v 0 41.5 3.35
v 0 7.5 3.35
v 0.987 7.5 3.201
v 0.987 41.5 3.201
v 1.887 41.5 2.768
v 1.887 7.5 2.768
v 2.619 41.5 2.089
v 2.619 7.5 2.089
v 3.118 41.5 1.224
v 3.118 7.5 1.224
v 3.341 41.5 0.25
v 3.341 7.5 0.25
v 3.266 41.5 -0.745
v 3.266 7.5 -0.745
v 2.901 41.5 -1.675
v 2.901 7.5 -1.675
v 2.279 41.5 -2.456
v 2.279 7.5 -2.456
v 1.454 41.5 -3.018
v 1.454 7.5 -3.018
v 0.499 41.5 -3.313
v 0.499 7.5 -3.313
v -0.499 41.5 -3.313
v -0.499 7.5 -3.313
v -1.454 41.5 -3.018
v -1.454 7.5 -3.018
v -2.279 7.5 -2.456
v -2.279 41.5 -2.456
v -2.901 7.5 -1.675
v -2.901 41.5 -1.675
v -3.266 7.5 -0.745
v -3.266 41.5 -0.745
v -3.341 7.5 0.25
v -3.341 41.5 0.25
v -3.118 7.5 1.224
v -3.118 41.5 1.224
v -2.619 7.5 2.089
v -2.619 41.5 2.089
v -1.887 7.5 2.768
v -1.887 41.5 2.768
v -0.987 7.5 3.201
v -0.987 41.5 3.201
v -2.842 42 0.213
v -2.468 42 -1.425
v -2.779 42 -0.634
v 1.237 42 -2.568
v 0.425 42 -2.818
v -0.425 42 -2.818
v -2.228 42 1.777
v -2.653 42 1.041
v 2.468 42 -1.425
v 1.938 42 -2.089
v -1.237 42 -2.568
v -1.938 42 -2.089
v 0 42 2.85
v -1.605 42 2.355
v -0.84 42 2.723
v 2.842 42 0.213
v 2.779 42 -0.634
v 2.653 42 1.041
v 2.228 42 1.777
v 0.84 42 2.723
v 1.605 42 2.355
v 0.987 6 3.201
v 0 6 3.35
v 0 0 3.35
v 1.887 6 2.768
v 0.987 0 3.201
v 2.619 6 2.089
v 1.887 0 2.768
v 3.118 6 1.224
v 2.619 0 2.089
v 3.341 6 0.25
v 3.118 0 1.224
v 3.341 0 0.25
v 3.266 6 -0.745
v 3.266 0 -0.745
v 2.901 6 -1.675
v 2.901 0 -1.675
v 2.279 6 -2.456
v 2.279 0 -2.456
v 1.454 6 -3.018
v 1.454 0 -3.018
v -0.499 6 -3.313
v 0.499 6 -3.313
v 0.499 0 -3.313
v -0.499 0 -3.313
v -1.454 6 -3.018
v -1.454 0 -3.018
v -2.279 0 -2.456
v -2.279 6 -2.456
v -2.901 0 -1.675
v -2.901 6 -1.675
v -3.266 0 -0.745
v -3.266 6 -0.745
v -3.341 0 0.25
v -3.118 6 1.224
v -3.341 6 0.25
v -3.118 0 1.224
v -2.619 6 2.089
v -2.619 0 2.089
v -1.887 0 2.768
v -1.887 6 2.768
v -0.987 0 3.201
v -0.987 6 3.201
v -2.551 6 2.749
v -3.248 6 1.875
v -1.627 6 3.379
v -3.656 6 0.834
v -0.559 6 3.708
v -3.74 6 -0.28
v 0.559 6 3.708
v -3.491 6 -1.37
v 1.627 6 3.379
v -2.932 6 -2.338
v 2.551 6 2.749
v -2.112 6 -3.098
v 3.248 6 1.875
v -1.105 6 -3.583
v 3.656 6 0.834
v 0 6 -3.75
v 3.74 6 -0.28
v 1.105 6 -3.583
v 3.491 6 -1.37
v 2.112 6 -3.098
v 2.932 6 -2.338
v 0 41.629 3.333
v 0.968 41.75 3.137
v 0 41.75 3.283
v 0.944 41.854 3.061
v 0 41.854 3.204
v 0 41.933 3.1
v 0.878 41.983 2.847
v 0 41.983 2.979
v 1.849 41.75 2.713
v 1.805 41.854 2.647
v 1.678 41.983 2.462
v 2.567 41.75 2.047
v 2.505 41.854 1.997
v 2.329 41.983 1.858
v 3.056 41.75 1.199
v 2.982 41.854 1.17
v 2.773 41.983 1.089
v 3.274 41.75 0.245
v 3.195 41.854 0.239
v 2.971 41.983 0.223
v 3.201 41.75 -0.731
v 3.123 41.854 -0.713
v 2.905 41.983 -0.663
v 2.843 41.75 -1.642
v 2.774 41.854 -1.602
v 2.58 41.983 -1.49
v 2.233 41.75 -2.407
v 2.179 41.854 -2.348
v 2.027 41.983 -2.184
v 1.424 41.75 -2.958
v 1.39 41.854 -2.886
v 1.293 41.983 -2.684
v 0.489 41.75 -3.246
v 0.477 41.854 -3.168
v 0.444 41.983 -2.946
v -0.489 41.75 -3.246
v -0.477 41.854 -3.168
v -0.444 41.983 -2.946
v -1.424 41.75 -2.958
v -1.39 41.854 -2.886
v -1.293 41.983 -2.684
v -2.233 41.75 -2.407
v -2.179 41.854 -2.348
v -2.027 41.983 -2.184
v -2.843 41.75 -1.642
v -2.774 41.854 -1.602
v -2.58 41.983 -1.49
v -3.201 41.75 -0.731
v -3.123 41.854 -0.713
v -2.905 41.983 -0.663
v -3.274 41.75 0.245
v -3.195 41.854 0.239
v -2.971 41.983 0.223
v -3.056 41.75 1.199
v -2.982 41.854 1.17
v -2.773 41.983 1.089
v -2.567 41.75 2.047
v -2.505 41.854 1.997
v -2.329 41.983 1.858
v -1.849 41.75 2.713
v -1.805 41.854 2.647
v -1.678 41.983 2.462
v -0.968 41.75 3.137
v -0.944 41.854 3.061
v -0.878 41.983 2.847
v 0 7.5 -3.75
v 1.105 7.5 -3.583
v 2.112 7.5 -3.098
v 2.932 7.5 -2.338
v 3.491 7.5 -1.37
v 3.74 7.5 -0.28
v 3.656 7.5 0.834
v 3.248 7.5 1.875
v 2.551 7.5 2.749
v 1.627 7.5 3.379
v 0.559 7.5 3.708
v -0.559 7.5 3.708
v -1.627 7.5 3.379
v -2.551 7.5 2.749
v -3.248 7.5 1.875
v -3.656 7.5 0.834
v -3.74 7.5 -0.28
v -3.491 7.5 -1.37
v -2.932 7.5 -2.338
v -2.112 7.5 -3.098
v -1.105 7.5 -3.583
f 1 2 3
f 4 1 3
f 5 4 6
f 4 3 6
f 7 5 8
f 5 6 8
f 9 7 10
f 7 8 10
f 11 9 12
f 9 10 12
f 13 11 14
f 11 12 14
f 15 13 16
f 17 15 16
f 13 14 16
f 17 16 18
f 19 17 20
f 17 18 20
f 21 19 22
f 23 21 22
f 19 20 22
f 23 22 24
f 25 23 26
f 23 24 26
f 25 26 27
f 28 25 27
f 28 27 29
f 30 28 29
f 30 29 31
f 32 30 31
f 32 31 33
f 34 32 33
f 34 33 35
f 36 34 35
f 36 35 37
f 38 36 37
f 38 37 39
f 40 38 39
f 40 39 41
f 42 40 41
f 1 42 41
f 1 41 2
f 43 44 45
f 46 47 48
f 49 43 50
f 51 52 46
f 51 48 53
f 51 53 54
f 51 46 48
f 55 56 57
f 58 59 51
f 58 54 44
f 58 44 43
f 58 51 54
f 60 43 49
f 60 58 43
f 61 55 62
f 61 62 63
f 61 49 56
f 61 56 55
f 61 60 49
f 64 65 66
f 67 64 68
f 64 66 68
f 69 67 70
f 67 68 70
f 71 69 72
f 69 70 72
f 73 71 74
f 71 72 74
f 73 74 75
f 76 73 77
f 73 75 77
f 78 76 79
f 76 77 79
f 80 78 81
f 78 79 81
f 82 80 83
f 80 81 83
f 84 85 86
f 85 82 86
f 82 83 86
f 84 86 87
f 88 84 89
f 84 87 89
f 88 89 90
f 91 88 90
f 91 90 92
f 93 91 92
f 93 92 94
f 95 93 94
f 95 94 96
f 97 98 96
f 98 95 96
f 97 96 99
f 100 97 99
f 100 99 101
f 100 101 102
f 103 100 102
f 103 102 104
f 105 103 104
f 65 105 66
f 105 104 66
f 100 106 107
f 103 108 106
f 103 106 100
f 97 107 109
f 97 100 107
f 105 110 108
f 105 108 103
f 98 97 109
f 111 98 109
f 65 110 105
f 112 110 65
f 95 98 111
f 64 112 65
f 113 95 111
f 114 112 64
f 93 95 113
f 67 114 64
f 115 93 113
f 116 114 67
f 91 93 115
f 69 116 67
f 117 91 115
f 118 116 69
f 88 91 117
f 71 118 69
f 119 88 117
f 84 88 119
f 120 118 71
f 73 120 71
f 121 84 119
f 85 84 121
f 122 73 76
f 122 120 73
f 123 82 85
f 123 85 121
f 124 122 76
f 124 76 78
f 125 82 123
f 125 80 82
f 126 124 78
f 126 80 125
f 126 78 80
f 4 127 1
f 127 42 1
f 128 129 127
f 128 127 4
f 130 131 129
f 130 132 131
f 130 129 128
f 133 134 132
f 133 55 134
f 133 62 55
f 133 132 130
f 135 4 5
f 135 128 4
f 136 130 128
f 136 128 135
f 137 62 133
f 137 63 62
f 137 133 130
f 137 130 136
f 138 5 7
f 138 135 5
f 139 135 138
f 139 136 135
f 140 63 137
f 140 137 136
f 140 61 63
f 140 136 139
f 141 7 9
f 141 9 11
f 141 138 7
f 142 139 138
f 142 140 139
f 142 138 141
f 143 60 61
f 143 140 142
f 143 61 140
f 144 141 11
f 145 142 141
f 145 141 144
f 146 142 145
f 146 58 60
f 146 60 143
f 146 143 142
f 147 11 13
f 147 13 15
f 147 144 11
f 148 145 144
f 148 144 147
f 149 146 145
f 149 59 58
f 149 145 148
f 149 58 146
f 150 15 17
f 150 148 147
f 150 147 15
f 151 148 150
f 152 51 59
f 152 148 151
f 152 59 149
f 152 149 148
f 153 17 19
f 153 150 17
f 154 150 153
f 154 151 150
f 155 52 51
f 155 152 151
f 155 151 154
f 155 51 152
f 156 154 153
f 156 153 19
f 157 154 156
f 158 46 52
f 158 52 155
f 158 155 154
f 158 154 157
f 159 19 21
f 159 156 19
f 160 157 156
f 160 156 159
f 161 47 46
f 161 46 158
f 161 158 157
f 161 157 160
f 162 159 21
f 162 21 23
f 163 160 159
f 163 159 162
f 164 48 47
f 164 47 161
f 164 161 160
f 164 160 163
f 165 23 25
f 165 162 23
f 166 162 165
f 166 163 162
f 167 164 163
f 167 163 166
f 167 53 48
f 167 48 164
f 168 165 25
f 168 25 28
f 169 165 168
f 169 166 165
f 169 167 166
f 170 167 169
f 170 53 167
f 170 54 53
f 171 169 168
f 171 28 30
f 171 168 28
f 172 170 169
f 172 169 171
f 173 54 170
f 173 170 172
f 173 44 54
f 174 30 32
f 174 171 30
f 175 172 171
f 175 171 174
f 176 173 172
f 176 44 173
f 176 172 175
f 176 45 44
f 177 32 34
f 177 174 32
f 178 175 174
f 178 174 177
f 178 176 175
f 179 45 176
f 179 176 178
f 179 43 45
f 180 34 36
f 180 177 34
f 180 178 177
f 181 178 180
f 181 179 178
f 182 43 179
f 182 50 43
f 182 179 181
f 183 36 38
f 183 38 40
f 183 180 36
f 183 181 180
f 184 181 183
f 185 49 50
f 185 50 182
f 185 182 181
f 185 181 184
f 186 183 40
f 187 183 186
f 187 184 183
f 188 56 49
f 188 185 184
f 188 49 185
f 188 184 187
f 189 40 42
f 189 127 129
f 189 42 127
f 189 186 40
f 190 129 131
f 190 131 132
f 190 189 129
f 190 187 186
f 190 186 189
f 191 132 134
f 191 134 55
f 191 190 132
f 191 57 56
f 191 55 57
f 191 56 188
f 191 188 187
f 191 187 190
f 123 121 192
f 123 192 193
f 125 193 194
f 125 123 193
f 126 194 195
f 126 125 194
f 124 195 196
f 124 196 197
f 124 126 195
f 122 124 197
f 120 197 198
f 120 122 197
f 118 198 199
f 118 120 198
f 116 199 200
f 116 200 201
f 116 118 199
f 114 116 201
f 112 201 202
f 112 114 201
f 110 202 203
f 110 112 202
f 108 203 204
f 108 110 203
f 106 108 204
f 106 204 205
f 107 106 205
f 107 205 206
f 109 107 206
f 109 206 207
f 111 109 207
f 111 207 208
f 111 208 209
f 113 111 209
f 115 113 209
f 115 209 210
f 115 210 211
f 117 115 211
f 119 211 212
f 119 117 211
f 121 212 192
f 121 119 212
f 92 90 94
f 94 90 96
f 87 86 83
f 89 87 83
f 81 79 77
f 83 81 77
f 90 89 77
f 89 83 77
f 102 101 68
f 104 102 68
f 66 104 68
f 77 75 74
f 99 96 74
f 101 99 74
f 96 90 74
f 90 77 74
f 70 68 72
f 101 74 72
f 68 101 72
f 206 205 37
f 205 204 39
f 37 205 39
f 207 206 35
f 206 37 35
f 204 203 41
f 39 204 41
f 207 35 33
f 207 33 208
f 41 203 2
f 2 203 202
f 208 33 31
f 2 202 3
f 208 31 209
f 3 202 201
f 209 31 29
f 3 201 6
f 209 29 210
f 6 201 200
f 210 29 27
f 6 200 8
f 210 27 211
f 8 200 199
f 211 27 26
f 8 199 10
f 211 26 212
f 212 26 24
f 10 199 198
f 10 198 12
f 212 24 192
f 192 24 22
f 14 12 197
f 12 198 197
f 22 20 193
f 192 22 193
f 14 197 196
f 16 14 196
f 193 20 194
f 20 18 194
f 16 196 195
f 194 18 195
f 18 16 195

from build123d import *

# Parameters (mm, degrees)
SKETCH1_R           = 3.35
BOSS_EXTRUDE1_DEPTH = 42
SKETCH4_R           = 3.75
BOSS_EXTRUDE3_DEPTH = 1.5
FILLET1_R           = 0.5


with BuildPart() as part:
    # Sketch1 → Boss-Extrude1 (new body)
    with BuildSketch(Plane(origin=(0, 0, 0), x_dir=(1, 0, 0), z_dir=(0, 1, 0))):
        with Locations(Location((0, 0, 0), (0, 0, 270))):  # turned: the seam where the file's is
            Circle(SKETCH1_R)
    extrude(amount=BOSS_EXTRUDE1_DEPTH)

    # Sketch4 → Boss-Extrude3 (add)
    with BuildSketch(Plane(origin=(0, 6, 0), x_dir=(-1, 0, 0), z_dir=(0, -1, 0))):
        with Locations(Location((0, 0, 0), (0, 0, 90))):  # turned: the seam where the file's is
            Circle(SKETCH4_R)
    extrude(amount=-BOSS_EXTRUDE3_DEPTH)

    # Fillet1
    fillet1_edges = [part.edges().sort_by_distance(p)[0] for p in [
        (0, 42, -3.35),
    ]]
    fillet(fillet1_edges, radius=FILLET1_R)


solid = part.part
